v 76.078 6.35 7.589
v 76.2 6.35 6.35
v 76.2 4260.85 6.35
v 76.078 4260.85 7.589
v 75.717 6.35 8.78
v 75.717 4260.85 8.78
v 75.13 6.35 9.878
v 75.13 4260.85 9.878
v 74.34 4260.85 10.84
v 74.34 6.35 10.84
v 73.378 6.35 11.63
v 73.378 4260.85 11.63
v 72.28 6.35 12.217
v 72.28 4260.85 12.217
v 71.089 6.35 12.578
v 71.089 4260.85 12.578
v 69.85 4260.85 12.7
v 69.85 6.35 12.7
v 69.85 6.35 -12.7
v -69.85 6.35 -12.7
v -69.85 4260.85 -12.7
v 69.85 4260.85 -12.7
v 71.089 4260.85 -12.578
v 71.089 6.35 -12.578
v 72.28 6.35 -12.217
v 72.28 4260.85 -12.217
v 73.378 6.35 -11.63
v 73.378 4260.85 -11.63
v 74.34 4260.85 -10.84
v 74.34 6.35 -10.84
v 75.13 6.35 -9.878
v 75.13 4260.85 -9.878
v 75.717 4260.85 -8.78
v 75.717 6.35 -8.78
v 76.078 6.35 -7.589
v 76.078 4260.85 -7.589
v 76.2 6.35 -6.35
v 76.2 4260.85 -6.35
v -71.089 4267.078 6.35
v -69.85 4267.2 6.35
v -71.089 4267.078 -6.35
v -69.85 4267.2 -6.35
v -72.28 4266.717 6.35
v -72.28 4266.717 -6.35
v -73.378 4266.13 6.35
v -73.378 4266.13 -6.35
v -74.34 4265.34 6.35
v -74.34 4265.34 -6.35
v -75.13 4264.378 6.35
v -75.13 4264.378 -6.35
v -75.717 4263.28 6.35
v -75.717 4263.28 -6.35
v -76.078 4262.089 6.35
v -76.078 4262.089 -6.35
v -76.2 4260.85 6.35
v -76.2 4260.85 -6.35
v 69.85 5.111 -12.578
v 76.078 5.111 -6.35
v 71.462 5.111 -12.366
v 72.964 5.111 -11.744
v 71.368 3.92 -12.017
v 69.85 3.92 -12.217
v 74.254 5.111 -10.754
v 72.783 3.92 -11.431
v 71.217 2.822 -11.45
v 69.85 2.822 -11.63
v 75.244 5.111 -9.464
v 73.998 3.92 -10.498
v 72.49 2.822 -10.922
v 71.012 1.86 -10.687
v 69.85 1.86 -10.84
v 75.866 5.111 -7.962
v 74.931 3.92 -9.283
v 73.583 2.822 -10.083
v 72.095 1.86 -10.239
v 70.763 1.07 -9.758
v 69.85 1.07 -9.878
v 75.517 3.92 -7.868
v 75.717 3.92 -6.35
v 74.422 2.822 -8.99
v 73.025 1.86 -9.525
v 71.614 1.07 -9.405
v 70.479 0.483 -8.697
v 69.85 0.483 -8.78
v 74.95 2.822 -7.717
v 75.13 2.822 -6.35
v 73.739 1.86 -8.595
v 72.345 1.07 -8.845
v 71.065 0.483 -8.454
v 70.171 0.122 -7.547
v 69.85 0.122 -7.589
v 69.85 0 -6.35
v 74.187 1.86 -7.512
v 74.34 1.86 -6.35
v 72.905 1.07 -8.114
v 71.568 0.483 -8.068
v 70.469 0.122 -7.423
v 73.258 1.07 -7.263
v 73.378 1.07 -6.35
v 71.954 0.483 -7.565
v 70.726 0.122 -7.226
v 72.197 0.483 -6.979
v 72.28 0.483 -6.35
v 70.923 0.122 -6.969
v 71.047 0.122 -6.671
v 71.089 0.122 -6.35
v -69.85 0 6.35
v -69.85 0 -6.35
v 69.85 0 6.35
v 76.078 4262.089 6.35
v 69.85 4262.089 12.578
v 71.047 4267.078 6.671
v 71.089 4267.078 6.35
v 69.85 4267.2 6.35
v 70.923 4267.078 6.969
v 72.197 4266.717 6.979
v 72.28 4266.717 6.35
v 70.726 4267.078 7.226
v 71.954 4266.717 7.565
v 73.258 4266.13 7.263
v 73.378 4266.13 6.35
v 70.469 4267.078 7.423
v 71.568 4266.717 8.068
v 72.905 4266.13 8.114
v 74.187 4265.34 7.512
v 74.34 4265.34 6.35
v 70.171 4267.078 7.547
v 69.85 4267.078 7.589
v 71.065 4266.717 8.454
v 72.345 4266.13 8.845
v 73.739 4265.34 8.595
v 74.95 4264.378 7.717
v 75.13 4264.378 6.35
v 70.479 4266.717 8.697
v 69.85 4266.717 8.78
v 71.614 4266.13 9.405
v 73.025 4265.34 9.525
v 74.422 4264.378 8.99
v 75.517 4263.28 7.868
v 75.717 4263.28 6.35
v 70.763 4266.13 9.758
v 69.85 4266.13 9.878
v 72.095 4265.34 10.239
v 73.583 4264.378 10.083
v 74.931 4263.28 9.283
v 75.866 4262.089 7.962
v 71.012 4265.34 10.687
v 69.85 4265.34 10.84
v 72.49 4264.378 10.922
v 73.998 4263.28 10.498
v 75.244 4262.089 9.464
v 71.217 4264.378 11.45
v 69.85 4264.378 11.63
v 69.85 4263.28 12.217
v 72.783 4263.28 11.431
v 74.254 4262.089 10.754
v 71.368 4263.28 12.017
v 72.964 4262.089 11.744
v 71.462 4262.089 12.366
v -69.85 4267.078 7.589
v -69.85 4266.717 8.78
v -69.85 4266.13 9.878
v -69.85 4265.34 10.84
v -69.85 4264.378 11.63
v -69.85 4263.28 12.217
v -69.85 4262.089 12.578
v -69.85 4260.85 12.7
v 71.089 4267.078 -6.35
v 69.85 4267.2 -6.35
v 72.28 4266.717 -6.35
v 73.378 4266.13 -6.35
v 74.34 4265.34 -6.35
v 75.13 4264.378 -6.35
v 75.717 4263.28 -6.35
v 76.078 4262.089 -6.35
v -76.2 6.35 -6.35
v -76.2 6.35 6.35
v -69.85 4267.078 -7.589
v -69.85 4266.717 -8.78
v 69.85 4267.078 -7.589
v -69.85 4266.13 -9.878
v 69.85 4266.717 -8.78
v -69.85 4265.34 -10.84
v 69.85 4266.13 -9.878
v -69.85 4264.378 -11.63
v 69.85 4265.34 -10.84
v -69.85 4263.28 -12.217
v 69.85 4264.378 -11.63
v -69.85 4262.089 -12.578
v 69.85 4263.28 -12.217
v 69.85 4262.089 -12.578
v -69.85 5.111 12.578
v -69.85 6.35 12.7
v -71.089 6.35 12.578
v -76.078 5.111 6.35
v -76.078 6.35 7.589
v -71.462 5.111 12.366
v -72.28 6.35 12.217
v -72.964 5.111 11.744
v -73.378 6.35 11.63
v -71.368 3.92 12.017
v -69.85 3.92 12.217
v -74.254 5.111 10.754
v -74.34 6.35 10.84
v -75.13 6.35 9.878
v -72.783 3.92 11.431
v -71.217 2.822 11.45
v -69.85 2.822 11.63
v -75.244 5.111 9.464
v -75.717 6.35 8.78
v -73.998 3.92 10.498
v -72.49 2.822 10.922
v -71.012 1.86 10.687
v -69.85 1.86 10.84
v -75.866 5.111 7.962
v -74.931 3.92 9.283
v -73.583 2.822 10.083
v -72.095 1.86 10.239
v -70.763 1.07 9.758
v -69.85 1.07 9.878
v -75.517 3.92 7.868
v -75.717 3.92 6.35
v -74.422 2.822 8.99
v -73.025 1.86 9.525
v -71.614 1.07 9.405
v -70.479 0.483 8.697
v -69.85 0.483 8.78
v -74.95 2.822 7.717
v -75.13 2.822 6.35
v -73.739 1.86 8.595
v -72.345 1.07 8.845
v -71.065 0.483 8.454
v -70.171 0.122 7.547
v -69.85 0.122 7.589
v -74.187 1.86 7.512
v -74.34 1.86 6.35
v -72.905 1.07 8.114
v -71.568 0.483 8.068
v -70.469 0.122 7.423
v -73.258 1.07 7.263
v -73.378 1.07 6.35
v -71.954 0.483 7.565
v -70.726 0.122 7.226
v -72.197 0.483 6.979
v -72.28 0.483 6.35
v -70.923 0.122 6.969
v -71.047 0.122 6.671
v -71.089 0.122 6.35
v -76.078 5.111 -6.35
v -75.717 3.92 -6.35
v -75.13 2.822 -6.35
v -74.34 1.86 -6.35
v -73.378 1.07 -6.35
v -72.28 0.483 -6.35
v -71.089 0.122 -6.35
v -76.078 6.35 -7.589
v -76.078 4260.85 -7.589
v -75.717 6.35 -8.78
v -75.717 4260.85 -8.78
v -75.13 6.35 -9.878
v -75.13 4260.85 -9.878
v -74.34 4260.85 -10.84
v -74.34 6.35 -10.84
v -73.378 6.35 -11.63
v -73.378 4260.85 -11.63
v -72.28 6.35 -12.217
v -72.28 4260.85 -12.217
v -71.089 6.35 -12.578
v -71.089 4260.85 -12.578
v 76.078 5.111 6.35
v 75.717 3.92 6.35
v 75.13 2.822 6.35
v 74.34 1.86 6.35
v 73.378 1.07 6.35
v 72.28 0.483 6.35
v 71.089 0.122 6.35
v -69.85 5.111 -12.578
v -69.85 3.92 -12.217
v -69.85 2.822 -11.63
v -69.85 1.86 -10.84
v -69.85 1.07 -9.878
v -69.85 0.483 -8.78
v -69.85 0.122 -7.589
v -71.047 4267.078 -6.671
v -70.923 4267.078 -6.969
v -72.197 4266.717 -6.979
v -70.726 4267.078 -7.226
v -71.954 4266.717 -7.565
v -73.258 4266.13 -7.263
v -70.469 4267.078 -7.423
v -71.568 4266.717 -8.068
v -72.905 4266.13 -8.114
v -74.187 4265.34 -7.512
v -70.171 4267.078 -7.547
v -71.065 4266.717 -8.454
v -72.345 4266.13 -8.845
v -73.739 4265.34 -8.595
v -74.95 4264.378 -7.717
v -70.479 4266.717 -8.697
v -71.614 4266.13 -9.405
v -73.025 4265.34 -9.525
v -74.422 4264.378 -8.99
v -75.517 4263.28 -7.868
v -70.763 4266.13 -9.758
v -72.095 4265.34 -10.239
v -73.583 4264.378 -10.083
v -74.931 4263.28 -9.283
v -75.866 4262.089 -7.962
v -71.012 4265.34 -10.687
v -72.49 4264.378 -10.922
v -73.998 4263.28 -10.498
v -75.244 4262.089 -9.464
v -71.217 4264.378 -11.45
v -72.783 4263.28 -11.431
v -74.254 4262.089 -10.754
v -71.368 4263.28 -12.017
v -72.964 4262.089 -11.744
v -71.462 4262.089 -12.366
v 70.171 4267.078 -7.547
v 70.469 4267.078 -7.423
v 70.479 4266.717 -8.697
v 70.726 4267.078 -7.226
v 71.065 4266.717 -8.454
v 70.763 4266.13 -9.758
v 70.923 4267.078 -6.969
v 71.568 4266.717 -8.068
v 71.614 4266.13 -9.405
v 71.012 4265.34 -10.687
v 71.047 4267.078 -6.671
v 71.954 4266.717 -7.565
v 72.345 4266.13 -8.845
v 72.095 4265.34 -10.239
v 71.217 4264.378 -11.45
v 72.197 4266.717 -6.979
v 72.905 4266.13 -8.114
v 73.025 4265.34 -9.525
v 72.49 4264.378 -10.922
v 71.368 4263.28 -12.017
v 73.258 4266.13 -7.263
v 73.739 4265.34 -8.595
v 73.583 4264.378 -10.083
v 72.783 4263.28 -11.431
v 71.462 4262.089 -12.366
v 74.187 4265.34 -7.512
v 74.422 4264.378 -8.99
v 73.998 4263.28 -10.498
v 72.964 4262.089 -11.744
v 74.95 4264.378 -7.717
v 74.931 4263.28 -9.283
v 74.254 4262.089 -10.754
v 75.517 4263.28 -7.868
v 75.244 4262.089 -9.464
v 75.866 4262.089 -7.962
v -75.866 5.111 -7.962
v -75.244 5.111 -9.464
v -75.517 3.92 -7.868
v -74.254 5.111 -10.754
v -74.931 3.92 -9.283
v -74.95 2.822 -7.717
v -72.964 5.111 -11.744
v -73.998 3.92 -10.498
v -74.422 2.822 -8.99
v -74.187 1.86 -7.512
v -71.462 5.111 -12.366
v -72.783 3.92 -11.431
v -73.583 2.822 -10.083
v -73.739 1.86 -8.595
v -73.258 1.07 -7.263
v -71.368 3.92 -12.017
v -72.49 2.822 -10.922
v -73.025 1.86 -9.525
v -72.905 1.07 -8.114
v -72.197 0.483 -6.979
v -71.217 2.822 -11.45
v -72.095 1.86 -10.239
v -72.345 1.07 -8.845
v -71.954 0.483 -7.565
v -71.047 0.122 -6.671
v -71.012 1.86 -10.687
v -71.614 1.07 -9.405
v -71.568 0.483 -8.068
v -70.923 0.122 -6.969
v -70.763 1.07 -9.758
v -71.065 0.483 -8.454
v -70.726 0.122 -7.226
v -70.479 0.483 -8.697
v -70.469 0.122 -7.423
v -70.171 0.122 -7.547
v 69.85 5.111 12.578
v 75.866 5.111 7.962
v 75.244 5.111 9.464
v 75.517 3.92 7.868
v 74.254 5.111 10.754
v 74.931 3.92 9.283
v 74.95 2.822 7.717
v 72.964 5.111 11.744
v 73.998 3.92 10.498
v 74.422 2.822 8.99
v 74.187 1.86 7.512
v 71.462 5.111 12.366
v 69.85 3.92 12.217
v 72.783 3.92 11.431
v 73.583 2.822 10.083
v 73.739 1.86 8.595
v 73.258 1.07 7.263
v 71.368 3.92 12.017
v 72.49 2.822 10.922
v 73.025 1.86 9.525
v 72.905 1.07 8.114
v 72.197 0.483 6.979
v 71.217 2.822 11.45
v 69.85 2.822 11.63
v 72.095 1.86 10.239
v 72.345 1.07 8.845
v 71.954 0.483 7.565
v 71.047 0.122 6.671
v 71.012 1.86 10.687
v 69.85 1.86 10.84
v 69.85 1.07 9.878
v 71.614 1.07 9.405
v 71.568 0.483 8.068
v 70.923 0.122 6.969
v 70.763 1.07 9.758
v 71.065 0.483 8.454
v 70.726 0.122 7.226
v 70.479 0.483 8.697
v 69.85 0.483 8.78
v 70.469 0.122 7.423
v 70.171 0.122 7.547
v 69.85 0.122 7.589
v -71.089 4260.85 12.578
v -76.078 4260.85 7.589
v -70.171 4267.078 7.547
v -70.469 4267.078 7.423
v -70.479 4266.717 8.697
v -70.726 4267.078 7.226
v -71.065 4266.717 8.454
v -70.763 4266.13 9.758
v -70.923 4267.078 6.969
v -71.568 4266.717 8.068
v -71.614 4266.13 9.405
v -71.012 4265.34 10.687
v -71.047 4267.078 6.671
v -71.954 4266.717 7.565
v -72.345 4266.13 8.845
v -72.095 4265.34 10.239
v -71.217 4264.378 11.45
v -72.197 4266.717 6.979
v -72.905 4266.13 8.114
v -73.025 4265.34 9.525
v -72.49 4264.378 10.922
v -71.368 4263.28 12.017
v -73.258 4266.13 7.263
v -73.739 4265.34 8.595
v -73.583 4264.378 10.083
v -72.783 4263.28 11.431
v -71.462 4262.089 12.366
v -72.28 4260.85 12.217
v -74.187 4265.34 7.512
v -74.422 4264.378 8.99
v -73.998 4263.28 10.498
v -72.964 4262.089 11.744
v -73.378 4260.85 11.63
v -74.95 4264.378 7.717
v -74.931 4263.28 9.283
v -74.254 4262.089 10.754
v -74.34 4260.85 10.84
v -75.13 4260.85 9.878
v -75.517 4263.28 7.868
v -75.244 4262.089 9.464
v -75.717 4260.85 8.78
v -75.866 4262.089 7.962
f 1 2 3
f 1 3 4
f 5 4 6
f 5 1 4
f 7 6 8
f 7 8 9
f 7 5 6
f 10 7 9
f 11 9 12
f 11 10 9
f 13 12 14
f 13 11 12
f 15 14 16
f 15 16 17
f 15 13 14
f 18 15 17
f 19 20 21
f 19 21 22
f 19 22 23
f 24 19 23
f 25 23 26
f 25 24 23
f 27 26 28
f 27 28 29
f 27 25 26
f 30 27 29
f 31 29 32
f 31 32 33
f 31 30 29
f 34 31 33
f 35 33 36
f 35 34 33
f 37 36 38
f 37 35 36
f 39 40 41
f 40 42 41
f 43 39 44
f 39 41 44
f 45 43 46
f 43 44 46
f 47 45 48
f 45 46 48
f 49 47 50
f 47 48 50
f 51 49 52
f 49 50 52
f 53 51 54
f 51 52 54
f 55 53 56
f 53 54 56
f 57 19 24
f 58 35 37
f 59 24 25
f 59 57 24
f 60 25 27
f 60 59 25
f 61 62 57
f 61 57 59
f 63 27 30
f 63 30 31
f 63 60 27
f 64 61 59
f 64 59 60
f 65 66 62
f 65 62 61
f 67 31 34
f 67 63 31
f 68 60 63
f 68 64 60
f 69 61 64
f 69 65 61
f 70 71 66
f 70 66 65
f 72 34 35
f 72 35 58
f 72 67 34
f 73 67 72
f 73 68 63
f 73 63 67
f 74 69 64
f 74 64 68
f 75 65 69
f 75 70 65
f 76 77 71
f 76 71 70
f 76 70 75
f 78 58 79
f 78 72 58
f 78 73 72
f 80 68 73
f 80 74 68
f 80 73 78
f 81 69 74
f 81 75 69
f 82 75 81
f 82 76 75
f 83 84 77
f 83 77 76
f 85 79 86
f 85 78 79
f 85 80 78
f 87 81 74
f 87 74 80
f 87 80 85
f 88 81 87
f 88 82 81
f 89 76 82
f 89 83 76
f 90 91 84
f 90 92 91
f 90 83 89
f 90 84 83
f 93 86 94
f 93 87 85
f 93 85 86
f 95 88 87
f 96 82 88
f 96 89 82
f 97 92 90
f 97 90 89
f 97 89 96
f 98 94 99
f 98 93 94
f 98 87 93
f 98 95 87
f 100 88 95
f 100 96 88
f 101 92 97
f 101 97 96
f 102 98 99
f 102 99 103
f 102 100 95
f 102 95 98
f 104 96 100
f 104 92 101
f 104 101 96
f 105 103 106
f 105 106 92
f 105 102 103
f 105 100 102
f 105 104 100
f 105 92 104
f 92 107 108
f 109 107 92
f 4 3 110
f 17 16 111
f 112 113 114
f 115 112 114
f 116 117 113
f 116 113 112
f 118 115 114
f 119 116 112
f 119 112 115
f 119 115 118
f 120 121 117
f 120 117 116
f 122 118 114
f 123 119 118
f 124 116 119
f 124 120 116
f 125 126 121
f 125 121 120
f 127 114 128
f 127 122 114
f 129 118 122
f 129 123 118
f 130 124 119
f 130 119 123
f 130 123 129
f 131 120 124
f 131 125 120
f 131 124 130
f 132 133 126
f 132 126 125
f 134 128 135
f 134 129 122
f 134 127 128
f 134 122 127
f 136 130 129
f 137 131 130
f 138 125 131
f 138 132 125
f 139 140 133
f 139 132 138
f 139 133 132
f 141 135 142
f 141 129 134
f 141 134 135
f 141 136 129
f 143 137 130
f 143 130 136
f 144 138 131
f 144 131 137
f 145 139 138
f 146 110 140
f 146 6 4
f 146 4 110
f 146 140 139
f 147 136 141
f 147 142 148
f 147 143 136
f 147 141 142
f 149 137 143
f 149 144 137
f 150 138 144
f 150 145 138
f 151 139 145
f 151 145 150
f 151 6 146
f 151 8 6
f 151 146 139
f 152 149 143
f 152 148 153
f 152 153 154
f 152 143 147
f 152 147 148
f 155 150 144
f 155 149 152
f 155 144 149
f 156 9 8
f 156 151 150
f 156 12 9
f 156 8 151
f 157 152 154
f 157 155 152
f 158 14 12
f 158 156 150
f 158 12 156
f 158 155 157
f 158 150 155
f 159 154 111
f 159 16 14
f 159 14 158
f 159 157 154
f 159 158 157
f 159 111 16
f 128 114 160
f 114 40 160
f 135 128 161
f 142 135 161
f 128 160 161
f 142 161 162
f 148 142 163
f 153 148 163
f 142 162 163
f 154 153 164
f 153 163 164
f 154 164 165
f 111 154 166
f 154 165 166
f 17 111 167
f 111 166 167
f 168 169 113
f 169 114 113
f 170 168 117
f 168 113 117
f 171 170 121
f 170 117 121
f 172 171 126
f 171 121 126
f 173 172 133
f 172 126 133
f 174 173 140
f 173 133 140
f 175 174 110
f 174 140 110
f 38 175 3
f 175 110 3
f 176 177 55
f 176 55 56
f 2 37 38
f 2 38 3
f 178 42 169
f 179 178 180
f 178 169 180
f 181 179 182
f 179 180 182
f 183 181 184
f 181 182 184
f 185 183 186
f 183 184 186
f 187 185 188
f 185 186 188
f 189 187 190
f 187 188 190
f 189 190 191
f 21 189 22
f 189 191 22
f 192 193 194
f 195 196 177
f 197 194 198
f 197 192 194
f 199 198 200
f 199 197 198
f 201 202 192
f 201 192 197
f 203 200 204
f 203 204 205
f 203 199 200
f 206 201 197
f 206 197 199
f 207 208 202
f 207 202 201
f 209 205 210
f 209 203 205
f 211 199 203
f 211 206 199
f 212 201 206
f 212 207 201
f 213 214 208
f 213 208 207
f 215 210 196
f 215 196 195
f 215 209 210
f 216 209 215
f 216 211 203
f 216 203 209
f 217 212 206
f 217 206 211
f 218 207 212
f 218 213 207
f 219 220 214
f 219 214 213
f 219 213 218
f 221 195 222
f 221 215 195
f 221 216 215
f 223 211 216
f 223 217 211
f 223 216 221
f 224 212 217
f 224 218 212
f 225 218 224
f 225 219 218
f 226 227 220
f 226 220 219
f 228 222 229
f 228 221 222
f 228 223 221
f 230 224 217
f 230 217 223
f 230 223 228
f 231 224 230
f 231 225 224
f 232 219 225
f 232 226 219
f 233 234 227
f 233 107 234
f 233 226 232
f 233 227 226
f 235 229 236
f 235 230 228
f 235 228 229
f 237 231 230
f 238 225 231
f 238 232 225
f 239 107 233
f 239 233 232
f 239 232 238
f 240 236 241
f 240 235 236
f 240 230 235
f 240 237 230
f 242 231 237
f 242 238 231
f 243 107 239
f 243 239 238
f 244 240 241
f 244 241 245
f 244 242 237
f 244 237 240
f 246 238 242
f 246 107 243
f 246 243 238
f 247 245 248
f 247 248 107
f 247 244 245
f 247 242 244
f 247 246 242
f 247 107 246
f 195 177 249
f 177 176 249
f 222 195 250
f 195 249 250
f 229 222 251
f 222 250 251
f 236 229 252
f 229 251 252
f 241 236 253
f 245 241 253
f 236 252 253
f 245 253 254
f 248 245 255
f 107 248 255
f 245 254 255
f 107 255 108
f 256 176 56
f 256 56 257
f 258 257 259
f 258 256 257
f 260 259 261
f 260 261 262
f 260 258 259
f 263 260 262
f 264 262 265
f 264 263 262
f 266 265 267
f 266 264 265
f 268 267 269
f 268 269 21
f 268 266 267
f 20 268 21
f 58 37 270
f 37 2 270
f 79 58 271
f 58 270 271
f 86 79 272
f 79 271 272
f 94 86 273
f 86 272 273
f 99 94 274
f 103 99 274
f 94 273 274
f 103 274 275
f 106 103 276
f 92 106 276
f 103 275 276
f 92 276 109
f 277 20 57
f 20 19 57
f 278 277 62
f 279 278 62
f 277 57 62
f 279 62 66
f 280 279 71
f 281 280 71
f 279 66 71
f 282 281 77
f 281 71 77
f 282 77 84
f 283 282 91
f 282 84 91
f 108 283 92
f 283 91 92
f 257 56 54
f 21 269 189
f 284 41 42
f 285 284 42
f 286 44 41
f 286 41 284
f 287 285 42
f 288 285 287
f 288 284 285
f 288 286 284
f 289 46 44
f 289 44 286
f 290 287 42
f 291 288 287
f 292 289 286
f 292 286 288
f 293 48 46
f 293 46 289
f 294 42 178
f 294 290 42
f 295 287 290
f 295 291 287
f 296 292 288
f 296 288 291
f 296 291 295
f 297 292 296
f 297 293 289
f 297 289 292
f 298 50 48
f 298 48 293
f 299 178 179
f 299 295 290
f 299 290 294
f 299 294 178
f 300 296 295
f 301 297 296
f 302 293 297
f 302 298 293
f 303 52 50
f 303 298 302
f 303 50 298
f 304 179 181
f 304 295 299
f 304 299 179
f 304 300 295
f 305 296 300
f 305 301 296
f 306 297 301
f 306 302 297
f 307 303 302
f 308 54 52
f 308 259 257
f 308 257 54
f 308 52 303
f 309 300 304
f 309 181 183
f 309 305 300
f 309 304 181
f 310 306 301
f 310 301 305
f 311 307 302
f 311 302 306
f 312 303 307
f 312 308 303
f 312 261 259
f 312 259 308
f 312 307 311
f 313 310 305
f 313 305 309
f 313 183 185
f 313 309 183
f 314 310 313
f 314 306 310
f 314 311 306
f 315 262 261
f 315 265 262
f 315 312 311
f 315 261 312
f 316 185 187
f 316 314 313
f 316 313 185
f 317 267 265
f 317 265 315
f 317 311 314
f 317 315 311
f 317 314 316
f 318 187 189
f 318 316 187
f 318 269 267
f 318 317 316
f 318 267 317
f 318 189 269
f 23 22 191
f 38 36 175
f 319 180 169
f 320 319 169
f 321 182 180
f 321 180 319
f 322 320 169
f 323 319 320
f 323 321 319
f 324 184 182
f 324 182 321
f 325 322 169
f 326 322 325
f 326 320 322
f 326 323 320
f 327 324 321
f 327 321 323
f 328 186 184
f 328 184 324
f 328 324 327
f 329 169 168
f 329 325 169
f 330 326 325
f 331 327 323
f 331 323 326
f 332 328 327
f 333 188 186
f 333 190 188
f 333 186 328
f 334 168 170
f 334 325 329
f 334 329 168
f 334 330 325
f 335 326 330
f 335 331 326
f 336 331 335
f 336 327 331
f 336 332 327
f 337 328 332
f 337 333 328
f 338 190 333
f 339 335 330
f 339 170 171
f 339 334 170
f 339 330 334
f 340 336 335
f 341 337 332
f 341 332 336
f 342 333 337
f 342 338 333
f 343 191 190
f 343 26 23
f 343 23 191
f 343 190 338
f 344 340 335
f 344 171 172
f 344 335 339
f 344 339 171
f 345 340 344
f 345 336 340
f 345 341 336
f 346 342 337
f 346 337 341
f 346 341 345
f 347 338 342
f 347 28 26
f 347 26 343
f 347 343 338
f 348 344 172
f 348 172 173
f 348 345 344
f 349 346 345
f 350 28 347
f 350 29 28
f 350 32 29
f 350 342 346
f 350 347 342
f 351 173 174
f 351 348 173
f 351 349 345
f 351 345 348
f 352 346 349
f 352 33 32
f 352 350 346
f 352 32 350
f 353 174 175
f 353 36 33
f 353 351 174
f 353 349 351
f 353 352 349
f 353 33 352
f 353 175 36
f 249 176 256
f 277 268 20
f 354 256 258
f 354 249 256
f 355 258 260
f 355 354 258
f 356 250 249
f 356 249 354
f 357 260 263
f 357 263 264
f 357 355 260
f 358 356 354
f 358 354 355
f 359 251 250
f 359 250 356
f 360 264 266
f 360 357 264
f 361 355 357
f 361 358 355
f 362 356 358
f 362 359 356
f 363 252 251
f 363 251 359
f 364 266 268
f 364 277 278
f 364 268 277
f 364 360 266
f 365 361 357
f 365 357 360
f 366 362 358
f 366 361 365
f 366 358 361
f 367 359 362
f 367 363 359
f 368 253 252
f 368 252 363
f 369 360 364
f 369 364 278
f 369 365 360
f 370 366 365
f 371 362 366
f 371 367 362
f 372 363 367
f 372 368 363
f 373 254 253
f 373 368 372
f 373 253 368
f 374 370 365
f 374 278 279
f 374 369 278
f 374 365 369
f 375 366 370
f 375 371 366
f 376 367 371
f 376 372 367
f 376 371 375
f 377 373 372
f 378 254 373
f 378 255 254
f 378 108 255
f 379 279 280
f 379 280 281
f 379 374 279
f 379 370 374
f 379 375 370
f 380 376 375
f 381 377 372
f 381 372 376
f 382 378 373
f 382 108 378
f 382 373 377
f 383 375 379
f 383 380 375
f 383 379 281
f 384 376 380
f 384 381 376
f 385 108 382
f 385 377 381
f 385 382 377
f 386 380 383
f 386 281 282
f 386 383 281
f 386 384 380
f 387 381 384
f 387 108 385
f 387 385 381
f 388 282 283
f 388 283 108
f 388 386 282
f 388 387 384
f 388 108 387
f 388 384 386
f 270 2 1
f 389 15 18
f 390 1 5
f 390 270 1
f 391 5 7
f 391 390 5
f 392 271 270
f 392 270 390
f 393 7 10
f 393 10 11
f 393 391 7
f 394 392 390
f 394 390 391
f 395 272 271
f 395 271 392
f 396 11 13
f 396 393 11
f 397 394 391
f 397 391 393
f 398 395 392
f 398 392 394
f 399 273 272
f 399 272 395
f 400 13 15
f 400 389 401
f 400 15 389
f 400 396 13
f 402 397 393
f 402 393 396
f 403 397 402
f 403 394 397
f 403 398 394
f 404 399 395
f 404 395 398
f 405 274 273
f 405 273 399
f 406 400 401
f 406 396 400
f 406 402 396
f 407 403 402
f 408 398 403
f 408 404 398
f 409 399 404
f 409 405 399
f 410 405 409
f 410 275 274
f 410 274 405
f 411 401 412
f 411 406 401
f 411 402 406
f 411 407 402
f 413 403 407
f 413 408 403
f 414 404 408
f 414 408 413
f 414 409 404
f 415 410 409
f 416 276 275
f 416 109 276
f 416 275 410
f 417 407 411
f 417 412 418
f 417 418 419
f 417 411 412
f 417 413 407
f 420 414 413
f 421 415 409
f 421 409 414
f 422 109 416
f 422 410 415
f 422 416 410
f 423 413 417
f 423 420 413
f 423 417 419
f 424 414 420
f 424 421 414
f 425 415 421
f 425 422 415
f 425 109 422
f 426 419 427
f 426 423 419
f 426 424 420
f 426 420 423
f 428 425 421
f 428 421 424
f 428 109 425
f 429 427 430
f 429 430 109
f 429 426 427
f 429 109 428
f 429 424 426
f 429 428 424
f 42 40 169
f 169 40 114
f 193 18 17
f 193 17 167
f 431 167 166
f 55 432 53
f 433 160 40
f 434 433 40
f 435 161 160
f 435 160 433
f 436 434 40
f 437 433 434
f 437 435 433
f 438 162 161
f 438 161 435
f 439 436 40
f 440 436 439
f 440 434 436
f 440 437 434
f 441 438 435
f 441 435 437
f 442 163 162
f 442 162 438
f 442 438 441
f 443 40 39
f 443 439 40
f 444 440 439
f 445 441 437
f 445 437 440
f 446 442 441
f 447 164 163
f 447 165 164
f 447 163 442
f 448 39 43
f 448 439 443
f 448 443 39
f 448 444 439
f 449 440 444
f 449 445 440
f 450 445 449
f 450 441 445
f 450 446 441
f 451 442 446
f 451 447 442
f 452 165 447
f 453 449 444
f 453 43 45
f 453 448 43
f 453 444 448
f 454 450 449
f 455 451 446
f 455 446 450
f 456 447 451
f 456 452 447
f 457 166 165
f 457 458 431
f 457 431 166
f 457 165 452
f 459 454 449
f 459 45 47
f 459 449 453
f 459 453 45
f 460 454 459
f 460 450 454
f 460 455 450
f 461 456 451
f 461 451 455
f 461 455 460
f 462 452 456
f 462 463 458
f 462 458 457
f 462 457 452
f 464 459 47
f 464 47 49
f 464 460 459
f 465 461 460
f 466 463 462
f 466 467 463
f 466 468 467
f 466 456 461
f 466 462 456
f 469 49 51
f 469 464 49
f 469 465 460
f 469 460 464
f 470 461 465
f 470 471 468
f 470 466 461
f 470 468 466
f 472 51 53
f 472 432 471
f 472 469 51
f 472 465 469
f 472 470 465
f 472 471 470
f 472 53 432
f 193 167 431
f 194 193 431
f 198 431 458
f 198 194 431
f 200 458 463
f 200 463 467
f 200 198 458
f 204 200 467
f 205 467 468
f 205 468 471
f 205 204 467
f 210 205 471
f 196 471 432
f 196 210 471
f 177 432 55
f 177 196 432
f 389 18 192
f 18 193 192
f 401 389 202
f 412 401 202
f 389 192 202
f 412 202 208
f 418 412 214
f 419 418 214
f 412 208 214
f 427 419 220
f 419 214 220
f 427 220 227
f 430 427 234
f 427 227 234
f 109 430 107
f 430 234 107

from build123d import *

# Parameters (mm, degrees)
F1_DEPTH = 4267.2
F2_R     = 6.35
F3_R     = 6.35


with BuildPart() as f1:
    # F0 (on Front) → F1 (new body)
    with BuildSketch(Plane.XZ):
        with BuildLine():
            Line((-69.85, -12.7), (69.85, -12.7))
            ThreePointArc((69.85, -12.7), (74.340128, -10.840128), (76.2, -6.35))
            Line((76.2, -6.35), (76.2, 6.35))
            ThreePointArc((76.2, 6.35), (74.340128, 10.840128), (69.85, 12.7))
            Line((69.85, 12.7), (-69.85, 12.7))
            ThreePointArc((-69.85, 12.7), (-74.340128, 10.840128), (-76.2, 6.35))
            Line((-76.2, 6.35), (-76.2, -6.35))
            ThreePointArc((-76.2, -6.35), (-74.340128, -10.840128), (-69.85, -12.7))
        make_face()
    extrude(amount=-F1_DEPTH)

    # F2
    f2_edges = [f1.edges().sort_by_distance(p)[0] for p in [
        (0, 0, 12.7),
        (0, 0, -12.7),
    ]]
    fillet(f2_edges, radius=F2_R)

    # F3
    f3_edges = [f1.edges().sort_by_distance(p)[0] for p in [
        (0, 4267.2, 12.7),
        (76.2, 4267.2, 0),
    ]]
    fillet(f3_edges, radius=F3_R)


solid = f1.part
